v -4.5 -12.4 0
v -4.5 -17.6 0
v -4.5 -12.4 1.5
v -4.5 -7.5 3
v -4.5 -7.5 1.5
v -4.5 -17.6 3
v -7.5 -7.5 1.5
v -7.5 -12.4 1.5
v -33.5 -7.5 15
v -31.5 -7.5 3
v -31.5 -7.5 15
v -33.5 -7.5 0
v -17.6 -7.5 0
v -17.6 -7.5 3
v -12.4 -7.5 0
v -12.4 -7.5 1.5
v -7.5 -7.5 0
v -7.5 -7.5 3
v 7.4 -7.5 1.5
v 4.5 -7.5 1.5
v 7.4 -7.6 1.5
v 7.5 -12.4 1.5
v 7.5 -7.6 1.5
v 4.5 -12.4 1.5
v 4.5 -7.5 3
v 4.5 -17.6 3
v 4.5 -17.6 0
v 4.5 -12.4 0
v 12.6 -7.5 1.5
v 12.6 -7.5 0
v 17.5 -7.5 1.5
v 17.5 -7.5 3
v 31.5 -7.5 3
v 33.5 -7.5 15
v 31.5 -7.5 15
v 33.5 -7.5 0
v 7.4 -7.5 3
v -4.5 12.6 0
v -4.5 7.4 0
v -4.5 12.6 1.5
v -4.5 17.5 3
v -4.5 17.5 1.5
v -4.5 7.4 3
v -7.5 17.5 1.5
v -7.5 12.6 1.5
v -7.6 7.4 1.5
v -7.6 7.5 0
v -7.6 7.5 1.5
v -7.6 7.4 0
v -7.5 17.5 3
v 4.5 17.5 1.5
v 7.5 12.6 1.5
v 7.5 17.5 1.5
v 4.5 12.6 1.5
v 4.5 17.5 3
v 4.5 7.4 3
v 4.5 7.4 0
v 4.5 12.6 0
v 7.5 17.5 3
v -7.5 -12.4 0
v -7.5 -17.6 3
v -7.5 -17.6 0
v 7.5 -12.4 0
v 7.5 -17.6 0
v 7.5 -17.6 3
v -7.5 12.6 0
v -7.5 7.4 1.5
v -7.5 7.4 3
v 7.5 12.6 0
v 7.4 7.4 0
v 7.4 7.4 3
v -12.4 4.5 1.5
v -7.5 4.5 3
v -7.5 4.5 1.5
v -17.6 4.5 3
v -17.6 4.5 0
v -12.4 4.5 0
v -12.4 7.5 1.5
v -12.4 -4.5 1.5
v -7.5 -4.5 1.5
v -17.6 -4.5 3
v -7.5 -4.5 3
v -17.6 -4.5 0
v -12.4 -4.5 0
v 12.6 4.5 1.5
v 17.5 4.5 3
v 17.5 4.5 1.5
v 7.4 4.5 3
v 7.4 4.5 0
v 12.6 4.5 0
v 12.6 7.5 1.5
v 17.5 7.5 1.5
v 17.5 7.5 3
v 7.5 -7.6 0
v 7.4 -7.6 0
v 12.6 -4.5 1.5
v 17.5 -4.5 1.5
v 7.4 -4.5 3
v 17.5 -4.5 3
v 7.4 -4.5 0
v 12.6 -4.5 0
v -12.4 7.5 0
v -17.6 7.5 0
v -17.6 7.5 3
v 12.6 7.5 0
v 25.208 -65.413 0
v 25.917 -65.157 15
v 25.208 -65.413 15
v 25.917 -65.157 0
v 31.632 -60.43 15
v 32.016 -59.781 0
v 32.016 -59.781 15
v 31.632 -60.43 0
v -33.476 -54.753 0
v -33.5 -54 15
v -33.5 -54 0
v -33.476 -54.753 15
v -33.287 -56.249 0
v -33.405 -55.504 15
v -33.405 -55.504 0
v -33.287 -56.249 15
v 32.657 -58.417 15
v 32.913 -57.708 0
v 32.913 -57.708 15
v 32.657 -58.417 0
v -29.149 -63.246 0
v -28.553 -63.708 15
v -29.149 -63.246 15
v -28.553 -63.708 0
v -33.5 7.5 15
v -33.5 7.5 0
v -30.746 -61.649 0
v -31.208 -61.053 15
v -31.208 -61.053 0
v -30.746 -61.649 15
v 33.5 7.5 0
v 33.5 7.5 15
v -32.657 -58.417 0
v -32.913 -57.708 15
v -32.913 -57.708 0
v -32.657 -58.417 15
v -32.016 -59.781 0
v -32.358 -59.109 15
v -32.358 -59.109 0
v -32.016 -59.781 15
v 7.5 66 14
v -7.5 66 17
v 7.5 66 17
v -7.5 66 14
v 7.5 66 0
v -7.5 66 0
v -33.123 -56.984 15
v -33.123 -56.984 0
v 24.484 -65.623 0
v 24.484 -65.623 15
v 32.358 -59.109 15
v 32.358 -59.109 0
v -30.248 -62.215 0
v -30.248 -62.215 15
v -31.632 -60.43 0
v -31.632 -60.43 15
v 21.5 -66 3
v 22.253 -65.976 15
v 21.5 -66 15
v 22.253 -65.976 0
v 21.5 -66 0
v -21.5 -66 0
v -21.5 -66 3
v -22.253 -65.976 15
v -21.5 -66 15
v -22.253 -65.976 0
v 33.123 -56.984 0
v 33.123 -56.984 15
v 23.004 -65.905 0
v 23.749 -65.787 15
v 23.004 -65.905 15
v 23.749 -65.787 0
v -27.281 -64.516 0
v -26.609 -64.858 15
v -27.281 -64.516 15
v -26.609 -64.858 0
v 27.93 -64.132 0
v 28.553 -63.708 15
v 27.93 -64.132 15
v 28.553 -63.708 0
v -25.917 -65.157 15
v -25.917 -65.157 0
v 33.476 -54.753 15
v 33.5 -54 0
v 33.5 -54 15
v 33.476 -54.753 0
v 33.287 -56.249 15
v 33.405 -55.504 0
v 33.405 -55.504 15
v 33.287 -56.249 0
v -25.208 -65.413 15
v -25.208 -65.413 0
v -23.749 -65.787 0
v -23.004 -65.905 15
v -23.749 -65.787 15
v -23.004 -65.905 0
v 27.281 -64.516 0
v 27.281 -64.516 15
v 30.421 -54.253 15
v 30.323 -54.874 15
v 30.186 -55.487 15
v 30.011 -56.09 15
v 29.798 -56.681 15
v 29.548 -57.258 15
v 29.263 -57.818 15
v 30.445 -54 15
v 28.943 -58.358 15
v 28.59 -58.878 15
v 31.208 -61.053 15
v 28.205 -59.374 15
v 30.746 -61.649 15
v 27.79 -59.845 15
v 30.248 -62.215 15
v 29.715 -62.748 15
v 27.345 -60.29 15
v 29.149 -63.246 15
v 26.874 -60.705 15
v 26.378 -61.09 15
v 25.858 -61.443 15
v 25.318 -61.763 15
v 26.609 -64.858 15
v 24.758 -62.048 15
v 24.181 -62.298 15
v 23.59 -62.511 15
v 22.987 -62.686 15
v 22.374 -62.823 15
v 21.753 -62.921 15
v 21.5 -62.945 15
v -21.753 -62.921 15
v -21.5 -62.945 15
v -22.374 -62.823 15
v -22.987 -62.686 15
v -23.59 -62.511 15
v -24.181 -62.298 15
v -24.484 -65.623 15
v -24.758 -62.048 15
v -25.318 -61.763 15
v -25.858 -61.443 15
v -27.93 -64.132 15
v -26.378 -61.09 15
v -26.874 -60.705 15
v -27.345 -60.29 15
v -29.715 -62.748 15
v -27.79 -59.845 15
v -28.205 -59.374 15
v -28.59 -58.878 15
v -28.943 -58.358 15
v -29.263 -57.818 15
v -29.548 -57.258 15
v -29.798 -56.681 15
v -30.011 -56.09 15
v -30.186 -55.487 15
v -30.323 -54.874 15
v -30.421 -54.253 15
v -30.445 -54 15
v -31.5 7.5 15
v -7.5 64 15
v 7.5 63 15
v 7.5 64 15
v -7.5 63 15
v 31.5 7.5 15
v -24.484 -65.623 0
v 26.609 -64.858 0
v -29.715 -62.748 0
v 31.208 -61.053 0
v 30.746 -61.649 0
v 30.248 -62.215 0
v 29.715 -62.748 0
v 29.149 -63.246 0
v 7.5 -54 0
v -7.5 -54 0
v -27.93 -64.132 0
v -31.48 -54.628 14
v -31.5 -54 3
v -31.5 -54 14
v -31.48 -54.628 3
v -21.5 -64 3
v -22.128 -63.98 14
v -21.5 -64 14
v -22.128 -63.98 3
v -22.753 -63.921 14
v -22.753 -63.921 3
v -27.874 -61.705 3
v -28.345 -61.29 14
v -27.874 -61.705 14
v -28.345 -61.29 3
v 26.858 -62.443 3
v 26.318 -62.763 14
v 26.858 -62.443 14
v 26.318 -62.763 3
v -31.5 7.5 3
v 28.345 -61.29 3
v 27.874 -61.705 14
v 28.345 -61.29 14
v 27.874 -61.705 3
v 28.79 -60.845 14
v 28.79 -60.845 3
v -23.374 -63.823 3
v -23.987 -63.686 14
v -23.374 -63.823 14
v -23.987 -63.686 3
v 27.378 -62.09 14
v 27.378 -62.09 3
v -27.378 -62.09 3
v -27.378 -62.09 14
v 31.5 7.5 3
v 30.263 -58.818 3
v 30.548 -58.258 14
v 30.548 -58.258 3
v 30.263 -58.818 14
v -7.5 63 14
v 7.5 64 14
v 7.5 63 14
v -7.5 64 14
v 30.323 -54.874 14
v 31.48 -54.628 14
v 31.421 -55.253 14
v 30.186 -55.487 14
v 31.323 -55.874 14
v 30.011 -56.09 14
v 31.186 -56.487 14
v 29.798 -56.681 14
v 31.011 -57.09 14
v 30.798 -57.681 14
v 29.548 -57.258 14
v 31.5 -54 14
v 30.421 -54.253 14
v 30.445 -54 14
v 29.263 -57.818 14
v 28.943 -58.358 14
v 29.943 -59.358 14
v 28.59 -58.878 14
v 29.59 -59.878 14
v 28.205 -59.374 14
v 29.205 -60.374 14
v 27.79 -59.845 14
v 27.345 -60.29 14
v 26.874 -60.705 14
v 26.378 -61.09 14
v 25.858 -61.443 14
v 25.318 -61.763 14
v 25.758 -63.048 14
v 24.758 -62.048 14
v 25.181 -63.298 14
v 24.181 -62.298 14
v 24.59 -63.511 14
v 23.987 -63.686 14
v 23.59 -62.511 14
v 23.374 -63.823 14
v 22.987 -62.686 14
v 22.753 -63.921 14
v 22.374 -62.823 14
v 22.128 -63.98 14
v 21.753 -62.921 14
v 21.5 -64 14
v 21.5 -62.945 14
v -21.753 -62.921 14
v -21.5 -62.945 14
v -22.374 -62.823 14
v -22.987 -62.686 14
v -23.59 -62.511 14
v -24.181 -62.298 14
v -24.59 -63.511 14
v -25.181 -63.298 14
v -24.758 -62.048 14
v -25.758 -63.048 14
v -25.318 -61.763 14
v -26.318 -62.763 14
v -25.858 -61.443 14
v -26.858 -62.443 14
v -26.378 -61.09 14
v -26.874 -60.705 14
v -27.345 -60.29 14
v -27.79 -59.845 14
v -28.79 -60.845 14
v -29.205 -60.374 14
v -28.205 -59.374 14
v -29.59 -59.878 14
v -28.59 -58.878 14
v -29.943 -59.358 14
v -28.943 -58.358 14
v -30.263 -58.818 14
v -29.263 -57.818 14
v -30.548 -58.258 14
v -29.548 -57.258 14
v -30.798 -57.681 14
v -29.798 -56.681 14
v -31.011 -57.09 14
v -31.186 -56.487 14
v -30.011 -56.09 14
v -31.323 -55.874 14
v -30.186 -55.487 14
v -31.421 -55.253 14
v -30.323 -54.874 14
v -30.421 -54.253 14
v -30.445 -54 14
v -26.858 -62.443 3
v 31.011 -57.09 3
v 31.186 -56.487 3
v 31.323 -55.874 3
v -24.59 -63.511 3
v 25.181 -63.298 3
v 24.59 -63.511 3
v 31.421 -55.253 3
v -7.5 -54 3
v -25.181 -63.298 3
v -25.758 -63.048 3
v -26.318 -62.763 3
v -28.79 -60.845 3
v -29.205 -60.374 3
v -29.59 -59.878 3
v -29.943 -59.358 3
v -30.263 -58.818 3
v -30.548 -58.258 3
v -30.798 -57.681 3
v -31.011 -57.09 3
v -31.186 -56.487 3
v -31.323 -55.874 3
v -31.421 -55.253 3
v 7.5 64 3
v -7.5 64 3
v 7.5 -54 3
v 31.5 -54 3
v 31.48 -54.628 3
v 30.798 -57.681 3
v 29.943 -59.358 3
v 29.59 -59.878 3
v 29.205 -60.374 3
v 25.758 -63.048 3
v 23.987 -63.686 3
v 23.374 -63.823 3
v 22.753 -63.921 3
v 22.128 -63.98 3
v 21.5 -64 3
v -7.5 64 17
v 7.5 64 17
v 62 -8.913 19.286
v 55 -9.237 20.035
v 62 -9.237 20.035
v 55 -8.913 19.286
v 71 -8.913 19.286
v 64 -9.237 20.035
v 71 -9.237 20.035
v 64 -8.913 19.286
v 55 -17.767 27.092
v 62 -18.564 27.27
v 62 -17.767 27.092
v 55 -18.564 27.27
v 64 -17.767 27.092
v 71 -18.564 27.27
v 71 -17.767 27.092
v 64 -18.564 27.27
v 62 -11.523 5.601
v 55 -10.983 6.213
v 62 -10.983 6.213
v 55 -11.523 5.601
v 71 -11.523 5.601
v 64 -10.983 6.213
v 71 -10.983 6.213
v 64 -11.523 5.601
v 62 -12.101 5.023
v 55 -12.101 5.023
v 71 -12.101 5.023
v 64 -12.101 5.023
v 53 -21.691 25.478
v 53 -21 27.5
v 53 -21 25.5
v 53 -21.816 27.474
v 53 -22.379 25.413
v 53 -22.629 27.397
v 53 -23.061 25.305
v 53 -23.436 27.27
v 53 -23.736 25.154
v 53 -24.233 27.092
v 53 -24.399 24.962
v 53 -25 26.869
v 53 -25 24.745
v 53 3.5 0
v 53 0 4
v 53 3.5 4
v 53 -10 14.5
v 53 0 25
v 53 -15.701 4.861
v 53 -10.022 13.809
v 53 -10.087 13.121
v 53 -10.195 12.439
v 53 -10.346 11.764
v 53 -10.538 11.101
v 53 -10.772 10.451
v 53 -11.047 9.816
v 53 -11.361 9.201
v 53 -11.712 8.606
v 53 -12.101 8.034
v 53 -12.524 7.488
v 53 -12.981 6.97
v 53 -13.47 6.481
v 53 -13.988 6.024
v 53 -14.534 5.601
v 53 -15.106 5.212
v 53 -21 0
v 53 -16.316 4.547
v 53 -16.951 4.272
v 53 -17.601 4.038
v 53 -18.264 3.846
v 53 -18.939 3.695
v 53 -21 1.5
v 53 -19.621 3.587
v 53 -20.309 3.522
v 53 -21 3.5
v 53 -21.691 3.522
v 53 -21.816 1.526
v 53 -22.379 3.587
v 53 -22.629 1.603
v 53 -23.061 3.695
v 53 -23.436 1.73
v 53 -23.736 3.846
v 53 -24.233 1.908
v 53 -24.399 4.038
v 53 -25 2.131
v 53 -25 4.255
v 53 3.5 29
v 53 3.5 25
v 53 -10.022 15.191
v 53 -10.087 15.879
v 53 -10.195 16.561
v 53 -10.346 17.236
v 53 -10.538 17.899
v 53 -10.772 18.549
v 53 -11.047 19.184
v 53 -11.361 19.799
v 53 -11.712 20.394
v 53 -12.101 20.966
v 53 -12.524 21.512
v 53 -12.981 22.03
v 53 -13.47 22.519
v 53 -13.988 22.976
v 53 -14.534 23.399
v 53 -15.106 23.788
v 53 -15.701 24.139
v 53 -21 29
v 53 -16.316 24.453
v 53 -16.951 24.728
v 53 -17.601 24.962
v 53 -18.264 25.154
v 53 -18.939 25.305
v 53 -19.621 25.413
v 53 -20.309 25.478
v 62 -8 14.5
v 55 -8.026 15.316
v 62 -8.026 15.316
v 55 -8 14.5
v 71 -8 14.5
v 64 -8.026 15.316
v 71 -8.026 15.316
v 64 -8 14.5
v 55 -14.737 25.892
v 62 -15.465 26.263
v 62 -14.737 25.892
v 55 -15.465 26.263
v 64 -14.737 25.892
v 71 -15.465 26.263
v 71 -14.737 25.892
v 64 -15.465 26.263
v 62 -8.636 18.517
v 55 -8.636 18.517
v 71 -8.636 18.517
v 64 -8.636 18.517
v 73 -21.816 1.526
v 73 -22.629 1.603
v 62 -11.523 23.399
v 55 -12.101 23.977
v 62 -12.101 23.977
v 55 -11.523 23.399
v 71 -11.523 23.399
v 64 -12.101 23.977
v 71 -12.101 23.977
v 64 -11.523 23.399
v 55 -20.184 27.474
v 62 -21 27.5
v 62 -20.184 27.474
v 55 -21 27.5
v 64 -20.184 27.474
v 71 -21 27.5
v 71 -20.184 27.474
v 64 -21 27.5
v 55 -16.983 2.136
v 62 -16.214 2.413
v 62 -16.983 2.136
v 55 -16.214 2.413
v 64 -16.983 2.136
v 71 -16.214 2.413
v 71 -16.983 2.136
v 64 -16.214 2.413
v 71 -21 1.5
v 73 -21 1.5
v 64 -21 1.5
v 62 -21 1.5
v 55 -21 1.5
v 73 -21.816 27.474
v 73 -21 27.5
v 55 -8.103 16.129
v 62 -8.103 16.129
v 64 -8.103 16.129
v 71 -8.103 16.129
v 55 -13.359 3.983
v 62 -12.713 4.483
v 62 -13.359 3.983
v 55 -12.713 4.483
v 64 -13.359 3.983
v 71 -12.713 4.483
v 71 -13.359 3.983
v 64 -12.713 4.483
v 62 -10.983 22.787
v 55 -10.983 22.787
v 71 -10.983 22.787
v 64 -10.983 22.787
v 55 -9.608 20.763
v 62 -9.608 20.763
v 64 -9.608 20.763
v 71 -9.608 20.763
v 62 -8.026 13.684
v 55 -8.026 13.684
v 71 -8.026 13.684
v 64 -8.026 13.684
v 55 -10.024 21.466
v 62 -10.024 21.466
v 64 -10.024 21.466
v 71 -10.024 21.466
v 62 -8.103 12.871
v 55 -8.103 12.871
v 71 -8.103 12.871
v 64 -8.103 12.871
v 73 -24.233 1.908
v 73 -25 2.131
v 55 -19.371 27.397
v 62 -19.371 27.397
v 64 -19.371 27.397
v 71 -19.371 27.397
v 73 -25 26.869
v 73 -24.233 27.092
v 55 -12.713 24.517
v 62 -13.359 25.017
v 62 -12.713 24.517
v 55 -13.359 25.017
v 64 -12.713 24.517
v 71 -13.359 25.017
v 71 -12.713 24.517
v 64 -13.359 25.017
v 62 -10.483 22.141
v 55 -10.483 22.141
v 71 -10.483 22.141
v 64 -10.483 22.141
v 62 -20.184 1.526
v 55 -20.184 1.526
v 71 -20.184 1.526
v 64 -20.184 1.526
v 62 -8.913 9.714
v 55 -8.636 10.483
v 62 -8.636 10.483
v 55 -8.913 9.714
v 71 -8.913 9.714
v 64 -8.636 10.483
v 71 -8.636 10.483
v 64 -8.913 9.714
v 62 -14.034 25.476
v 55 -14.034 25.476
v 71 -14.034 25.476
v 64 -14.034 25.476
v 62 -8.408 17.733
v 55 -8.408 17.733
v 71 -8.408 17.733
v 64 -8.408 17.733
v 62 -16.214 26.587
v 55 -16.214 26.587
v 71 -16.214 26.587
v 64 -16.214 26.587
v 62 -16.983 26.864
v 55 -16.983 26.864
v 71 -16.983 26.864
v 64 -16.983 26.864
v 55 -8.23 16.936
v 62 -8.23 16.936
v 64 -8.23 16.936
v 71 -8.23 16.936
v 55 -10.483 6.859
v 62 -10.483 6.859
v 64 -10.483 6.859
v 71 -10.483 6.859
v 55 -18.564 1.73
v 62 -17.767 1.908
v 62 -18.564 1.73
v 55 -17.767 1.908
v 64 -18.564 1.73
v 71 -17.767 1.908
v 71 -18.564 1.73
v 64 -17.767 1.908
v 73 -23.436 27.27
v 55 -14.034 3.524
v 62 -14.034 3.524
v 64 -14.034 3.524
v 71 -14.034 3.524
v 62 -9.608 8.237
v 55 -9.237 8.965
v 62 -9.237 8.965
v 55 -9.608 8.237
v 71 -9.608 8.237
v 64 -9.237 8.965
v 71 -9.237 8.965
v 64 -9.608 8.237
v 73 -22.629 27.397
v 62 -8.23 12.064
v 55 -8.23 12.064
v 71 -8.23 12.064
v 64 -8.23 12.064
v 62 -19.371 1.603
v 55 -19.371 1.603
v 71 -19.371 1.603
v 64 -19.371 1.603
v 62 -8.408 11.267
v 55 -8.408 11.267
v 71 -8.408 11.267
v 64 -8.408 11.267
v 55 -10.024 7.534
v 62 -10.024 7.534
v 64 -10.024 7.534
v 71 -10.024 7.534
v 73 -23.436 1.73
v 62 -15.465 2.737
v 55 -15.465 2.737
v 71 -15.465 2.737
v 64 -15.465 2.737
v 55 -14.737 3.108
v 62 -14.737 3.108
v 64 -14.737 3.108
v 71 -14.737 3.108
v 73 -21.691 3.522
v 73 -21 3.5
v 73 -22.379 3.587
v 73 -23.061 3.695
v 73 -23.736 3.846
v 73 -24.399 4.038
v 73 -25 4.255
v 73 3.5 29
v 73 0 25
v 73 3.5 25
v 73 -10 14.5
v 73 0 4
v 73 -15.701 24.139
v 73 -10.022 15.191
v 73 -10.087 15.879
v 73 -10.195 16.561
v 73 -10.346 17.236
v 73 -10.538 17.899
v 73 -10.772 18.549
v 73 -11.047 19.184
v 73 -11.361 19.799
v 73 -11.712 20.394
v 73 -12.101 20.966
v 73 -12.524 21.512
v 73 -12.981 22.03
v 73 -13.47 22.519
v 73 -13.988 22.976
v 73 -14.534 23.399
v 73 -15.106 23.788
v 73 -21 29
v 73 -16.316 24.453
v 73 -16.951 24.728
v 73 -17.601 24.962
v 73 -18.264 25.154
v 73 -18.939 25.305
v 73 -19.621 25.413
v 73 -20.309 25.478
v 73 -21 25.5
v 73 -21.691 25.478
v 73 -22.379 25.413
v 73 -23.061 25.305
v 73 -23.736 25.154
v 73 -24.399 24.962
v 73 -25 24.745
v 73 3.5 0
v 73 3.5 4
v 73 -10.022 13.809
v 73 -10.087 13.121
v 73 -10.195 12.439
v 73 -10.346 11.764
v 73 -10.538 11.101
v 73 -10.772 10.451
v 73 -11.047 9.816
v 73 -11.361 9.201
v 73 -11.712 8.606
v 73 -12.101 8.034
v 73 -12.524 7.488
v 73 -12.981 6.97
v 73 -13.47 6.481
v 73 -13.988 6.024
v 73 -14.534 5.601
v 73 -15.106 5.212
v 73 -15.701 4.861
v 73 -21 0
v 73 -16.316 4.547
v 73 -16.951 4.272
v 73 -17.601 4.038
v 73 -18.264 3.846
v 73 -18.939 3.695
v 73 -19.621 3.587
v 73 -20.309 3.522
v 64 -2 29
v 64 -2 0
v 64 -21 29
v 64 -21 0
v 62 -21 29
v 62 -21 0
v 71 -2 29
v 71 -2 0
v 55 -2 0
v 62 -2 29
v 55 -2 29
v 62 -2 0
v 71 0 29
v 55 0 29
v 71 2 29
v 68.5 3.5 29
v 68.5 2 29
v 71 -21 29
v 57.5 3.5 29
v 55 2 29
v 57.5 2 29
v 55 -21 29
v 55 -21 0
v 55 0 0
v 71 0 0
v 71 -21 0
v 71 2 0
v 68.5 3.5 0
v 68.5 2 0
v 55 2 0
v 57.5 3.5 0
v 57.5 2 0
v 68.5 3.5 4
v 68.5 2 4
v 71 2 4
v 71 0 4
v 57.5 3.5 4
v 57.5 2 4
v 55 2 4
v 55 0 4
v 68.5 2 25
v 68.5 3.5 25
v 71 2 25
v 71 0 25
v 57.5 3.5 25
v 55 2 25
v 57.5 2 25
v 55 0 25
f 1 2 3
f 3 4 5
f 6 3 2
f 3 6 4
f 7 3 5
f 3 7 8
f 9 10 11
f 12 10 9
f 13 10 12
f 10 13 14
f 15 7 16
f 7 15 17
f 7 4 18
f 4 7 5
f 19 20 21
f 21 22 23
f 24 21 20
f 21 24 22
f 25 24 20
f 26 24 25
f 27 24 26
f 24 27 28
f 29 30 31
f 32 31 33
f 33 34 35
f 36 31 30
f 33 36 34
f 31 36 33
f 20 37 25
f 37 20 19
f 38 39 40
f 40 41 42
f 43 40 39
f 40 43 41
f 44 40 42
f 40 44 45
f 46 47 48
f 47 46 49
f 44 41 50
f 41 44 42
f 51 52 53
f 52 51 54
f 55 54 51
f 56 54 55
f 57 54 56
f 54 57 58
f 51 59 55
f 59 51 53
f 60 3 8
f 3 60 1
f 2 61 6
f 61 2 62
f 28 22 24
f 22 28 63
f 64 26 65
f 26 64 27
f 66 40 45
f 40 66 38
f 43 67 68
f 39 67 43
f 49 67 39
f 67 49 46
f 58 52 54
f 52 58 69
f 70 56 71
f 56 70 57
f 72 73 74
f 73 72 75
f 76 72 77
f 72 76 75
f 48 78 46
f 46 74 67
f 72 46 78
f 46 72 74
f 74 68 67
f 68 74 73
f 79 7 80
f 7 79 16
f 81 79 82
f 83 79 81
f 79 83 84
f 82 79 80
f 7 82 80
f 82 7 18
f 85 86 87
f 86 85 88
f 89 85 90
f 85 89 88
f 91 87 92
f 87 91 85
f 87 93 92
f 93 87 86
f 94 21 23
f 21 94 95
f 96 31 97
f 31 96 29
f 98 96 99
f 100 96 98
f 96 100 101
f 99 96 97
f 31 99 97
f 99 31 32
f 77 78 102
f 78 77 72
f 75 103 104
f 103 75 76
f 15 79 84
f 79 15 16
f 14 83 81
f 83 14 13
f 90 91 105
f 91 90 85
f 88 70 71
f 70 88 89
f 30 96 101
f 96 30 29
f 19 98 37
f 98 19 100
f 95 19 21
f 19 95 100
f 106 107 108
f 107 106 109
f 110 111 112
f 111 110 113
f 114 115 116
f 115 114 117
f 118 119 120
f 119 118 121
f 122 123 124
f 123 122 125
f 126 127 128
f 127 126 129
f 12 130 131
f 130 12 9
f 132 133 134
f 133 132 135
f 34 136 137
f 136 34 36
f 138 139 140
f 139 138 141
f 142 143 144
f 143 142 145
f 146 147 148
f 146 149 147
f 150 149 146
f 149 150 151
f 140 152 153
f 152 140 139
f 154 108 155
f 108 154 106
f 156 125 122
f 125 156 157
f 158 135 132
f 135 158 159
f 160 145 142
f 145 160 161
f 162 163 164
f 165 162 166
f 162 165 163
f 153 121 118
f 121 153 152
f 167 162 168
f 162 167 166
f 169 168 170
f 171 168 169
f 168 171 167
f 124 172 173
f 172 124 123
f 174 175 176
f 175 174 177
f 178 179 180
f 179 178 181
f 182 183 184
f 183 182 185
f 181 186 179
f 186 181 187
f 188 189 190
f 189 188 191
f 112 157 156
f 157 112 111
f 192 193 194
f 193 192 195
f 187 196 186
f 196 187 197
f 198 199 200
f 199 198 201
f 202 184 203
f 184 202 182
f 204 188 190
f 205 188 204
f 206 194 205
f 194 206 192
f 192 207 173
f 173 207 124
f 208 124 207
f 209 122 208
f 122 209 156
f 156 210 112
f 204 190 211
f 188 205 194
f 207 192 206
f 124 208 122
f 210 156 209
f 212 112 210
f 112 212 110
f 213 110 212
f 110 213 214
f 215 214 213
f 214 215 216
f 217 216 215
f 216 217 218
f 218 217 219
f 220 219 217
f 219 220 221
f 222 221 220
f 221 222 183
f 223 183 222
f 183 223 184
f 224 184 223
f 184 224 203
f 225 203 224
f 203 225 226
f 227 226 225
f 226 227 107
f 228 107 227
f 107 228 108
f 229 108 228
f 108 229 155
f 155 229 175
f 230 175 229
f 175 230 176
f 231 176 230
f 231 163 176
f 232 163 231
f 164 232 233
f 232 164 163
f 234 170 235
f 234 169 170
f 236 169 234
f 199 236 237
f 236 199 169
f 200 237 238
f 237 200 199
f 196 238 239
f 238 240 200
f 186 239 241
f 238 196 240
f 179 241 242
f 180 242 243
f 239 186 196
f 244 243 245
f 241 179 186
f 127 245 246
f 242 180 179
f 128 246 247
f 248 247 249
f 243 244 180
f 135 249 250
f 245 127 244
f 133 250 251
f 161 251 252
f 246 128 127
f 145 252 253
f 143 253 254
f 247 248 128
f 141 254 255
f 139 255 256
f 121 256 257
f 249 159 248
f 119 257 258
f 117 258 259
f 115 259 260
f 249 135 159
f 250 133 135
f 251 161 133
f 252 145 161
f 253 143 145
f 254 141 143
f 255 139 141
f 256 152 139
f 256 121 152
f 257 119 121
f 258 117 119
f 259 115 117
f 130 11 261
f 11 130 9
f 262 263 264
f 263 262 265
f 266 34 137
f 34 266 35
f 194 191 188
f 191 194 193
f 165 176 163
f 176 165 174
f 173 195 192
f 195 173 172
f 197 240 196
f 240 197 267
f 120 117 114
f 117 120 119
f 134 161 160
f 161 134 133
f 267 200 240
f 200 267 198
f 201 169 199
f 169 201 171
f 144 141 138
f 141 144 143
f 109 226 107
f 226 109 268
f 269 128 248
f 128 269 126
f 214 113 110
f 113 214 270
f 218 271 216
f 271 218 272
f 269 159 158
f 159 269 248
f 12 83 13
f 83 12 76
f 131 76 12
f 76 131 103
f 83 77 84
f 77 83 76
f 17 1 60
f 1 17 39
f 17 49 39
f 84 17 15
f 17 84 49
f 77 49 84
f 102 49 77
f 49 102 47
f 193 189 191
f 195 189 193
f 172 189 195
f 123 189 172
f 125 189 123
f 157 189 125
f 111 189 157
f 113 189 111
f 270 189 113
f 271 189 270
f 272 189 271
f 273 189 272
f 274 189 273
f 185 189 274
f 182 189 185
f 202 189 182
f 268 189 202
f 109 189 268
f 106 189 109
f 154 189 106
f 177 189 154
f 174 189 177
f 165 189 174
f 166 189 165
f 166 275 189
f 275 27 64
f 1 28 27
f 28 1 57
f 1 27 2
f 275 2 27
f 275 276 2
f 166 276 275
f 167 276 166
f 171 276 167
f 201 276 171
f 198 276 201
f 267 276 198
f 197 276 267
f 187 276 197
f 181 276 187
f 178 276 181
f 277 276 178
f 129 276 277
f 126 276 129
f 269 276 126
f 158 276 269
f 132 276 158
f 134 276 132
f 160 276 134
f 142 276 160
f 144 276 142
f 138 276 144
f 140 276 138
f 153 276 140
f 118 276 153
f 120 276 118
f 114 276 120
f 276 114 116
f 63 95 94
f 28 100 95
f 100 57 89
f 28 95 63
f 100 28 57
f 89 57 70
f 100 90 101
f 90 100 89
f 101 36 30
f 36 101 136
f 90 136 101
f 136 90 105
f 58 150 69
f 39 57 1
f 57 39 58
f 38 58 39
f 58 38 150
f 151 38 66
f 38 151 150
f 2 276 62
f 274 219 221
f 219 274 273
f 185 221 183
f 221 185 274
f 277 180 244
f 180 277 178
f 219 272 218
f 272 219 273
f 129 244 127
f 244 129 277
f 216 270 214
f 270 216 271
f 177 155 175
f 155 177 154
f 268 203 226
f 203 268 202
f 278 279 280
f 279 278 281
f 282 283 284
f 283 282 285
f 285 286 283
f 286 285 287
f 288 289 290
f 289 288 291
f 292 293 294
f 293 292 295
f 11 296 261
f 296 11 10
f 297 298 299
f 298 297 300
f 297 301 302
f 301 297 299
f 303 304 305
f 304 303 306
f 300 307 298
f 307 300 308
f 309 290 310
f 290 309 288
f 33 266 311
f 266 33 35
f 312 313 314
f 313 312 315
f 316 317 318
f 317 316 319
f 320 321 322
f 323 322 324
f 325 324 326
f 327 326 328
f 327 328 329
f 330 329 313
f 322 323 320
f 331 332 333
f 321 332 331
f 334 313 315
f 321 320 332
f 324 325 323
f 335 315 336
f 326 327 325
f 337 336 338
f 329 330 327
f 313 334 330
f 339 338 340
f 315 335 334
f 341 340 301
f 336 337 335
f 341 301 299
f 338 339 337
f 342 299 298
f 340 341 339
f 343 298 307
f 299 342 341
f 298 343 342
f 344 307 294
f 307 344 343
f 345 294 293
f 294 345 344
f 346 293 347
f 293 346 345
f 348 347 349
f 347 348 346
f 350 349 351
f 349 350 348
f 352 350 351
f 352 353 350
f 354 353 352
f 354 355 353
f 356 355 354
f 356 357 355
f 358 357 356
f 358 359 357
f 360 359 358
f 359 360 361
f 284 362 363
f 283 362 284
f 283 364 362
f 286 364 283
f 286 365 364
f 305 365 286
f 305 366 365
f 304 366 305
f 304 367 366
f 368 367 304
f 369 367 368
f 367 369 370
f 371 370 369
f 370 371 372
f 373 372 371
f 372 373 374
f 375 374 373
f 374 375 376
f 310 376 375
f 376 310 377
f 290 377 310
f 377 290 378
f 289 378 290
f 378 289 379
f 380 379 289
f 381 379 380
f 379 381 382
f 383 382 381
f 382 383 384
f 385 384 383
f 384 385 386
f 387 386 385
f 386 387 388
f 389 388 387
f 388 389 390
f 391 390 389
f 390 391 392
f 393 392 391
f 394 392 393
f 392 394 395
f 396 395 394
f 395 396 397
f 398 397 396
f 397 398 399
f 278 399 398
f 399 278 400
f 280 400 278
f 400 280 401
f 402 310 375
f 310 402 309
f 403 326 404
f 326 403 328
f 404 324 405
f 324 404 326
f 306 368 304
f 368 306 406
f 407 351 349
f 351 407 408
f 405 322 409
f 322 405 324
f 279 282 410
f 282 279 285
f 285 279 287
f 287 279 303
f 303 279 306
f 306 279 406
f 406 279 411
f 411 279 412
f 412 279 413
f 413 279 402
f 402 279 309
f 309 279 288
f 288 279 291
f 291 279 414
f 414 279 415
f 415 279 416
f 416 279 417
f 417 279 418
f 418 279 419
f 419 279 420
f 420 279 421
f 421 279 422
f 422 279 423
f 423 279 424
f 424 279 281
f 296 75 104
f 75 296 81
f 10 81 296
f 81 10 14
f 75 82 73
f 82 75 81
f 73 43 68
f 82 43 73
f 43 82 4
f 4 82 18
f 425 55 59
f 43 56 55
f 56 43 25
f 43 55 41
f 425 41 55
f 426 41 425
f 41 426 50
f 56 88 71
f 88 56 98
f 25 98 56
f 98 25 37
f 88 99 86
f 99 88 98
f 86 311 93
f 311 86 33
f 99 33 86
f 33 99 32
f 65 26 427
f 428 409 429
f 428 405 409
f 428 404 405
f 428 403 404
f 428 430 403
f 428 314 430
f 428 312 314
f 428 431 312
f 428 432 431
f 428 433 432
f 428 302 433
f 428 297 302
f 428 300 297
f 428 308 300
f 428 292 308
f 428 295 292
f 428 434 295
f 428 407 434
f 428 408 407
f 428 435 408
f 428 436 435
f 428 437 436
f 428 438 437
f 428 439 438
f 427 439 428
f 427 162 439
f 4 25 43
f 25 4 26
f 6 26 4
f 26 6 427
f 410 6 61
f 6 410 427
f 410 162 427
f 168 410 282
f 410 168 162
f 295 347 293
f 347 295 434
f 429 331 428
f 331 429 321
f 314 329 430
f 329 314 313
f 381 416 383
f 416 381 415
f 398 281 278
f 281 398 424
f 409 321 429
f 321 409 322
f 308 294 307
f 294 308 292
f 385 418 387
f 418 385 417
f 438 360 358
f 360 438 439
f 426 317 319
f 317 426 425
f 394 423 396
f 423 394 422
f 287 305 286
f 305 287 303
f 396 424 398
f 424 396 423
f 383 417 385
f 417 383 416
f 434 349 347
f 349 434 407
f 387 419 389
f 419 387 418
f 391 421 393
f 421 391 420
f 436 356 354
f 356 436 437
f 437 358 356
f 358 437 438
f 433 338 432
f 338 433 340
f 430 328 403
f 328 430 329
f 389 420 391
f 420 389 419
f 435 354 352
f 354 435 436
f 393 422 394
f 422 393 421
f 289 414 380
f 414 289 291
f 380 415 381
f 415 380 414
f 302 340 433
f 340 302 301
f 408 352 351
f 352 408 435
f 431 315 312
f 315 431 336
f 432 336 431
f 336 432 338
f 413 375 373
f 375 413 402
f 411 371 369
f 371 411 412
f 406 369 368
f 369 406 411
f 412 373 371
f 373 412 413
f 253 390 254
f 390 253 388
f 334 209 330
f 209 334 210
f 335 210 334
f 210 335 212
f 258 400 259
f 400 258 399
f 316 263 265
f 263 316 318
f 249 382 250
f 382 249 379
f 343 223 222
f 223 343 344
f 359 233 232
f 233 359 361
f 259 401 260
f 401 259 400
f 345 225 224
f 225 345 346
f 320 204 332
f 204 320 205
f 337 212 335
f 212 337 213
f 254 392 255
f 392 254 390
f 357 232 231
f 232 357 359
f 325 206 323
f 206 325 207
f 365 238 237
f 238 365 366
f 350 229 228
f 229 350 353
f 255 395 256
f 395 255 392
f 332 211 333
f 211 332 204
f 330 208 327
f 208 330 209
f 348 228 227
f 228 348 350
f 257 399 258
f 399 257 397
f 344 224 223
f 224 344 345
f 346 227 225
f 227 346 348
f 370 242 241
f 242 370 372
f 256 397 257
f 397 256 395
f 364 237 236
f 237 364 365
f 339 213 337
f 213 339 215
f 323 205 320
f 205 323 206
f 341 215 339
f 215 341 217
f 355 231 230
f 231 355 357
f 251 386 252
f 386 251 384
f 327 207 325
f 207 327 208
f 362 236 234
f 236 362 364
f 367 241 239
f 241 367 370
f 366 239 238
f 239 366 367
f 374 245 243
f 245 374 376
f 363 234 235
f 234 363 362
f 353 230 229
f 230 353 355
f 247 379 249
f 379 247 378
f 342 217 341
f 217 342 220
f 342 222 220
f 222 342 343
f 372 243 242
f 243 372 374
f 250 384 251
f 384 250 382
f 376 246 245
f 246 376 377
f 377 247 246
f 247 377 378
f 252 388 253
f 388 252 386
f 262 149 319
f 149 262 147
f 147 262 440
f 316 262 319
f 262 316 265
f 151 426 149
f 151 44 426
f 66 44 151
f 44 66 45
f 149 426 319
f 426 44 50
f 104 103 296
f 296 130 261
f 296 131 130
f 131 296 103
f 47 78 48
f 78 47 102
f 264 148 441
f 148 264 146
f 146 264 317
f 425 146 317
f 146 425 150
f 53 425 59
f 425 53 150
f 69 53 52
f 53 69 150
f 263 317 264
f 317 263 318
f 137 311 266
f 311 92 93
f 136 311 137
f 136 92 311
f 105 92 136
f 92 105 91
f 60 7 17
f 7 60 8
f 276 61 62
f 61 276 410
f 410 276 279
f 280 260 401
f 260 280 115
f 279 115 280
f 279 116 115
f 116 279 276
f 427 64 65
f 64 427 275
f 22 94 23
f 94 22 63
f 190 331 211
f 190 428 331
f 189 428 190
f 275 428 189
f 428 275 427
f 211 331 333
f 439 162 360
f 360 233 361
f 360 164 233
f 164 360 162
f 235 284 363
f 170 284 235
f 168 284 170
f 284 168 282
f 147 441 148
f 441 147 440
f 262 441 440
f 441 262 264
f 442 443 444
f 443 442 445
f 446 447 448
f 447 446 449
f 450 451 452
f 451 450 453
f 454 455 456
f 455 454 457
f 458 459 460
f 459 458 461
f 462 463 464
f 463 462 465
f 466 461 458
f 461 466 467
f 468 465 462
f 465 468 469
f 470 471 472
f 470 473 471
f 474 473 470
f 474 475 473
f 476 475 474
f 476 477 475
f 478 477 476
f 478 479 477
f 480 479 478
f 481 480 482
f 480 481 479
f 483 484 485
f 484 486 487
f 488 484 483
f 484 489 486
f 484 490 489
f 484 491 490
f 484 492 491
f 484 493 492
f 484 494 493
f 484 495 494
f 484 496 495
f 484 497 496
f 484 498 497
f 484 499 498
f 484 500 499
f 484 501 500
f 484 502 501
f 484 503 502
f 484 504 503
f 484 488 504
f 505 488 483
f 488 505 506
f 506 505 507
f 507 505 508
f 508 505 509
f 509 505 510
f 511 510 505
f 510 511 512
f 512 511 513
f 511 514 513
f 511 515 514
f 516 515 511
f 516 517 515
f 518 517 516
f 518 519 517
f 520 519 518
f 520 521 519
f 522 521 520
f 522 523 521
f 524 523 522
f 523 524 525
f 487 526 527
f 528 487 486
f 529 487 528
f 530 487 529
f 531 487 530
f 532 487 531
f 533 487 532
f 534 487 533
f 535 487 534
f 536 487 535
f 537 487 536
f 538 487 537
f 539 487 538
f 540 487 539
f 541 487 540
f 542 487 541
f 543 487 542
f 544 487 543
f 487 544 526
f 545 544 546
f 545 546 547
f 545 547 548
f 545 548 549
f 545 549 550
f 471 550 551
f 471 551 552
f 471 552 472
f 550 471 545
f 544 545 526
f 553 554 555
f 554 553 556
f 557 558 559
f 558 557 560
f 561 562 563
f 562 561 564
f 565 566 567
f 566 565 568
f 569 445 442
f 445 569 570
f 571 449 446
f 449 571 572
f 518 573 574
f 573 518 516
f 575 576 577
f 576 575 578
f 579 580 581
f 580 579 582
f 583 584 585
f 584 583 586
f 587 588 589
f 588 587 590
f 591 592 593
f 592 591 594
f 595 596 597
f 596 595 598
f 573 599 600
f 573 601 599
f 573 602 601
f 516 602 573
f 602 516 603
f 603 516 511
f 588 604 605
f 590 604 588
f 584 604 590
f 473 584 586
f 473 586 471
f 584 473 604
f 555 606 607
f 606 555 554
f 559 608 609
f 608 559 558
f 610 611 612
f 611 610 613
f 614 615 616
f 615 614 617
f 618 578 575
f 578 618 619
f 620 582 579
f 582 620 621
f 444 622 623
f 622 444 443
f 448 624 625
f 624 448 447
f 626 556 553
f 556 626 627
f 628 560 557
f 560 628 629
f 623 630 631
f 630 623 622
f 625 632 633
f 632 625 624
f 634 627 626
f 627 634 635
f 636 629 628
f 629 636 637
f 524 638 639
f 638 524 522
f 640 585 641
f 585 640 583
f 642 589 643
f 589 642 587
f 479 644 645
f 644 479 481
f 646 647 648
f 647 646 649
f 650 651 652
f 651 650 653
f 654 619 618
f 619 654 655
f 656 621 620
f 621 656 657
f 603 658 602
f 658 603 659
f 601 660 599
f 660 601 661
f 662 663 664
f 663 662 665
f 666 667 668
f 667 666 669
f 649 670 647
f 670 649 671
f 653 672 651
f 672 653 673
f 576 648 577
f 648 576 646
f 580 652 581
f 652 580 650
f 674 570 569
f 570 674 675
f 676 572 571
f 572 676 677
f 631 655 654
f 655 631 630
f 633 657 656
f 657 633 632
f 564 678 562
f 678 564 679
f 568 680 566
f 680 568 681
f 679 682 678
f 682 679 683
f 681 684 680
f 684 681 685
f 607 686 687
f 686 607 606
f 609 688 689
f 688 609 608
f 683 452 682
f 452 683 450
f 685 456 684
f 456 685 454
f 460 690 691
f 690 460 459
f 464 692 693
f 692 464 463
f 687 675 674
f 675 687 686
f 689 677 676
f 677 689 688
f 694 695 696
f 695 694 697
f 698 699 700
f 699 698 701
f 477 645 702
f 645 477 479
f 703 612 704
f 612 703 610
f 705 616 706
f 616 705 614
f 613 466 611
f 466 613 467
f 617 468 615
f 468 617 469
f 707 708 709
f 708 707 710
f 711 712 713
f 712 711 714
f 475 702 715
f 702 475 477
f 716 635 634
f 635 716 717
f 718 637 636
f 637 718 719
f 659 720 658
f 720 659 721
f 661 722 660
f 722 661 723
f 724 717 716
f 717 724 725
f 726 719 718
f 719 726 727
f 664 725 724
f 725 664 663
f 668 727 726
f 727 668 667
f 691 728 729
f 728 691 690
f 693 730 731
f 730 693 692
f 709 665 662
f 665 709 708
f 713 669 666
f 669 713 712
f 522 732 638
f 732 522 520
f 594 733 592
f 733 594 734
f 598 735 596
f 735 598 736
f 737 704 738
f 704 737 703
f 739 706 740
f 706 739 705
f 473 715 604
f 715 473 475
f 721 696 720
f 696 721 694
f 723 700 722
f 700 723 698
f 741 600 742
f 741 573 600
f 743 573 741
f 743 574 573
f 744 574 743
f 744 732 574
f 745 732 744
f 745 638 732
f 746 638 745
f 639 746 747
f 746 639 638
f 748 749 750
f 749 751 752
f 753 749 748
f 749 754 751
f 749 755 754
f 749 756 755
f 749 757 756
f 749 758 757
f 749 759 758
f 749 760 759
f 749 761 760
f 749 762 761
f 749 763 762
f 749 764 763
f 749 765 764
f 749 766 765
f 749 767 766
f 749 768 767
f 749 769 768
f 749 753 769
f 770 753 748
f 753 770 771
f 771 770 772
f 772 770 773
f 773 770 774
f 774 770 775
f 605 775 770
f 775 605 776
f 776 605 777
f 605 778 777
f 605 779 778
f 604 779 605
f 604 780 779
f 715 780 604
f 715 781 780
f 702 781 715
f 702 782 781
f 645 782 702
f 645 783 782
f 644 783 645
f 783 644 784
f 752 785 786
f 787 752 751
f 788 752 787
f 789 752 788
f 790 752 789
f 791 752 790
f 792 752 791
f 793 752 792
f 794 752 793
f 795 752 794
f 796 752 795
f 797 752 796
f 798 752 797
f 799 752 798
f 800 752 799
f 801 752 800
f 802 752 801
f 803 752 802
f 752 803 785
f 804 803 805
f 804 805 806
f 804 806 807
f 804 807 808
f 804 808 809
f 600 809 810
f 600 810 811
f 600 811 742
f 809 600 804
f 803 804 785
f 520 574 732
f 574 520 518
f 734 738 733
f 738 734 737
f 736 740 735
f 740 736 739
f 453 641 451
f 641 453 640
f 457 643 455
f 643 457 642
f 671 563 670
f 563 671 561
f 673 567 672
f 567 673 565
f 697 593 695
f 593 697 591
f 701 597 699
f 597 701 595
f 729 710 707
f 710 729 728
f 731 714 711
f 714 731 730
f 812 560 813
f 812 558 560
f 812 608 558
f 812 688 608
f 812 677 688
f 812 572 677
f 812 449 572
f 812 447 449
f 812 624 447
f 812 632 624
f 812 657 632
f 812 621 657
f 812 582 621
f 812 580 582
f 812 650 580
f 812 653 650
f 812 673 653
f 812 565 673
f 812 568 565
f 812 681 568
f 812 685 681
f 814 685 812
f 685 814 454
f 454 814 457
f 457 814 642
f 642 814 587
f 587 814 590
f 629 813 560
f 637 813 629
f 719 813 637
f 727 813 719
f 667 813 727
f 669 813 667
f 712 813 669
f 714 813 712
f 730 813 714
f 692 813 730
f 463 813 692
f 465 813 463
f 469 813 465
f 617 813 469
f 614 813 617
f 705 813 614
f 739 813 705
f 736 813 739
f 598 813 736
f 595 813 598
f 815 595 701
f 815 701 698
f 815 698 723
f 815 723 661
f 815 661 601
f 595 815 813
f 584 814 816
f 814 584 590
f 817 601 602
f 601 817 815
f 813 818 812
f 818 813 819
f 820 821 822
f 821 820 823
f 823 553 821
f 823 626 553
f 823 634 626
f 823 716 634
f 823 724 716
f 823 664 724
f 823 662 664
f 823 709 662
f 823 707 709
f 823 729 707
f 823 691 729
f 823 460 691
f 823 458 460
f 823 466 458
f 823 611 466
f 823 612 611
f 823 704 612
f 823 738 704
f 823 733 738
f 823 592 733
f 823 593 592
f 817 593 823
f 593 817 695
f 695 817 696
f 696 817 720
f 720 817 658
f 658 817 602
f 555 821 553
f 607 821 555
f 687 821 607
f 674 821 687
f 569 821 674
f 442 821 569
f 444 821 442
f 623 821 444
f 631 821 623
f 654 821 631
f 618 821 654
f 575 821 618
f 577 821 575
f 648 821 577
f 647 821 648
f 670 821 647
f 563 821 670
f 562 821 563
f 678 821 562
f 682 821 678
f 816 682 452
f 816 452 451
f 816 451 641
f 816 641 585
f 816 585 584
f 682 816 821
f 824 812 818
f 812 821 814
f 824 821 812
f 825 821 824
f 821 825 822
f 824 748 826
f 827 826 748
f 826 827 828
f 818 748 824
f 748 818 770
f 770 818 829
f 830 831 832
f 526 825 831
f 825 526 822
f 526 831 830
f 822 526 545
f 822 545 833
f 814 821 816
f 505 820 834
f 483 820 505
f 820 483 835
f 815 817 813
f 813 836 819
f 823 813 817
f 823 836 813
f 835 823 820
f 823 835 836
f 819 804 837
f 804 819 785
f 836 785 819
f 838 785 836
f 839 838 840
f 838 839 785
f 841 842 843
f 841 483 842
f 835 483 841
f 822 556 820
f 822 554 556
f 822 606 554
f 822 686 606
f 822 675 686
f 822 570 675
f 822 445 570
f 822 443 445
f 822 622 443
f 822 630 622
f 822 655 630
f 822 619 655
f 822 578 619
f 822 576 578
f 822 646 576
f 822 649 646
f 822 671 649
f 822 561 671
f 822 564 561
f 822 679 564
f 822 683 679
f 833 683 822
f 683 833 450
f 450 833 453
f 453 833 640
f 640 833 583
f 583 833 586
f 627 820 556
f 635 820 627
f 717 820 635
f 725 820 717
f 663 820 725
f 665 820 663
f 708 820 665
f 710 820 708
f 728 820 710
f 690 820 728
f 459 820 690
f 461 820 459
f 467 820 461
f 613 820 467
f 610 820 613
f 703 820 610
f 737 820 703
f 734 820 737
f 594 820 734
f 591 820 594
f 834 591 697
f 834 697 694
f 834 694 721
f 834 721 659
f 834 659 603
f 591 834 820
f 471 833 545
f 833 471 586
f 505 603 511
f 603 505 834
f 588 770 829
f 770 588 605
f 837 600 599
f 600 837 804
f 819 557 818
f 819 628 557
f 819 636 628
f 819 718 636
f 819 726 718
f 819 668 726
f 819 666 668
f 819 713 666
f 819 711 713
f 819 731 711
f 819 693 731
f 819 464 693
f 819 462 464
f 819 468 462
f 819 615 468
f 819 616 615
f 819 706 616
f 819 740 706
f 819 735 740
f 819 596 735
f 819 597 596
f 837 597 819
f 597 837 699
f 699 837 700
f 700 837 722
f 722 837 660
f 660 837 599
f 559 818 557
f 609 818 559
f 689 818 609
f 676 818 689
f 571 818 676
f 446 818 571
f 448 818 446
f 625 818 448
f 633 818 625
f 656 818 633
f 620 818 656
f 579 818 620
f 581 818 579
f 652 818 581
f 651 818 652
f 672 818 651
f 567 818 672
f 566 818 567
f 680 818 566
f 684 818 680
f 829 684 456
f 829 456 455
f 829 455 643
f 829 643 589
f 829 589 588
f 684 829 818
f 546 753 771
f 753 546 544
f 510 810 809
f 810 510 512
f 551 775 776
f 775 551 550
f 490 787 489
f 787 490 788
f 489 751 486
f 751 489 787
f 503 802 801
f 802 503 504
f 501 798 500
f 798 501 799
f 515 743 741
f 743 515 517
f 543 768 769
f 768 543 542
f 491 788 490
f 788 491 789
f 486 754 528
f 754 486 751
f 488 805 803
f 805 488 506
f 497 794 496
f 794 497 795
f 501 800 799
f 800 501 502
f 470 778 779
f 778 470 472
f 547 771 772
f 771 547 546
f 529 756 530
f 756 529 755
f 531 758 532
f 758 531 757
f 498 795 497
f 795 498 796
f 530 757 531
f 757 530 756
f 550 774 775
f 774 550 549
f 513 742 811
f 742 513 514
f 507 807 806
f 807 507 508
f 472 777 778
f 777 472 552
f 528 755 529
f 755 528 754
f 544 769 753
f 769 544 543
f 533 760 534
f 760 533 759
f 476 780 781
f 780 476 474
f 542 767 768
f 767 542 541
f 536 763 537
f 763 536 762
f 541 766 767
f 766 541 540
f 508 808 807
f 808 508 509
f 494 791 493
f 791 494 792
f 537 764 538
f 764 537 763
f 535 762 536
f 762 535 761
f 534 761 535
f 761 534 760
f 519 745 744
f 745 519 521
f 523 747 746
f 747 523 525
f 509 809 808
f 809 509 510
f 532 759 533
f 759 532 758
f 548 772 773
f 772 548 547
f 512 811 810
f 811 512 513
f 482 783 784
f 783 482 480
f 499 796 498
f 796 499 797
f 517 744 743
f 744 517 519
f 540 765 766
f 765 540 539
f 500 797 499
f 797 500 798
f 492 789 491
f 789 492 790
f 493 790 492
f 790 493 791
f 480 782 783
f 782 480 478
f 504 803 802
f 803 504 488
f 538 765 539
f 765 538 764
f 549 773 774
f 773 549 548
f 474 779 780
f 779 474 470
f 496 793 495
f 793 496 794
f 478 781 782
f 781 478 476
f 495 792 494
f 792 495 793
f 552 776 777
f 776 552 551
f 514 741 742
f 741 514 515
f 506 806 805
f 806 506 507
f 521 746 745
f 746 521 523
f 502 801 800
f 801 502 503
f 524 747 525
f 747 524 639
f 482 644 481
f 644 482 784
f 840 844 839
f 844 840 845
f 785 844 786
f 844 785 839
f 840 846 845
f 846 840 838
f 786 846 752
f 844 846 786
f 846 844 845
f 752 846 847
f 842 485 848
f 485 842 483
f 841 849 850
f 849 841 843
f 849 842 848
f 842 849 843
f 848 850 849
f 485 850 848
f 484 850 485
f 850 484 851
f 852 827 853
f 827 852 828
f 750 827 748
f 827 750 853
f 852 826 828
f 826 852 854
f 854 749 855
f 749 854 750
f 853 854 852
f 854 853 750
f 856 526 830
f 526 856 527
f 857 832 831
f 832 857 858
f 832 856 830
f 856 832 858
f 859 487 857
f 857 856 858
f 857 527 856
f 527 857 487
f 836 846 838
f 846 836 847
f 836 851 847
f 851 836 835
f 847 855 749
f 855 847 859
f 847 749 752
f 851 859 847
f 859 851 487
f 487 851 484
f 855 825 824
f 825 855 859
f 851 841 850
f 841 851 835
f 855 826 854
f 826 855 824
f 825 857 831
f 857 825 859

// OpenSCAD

// The outer width (from left to right without buttons) of the phone or bumper in millimeters
width = 63;
// The outer length (from top to bottom without buttons) of the phone or bumper in millimeters
length = 128;
// The outer height (from backside to front side) of the phone or bumper in millimeters
height = 11;
// The width of the bridges from top to bottom and from left to right in millimeters. Lower values save material, higher values make the mount more stable. 15 millimeter is a good choice.
bridgewidth = 15;
// The radius of the corners of the phone or bumper. The standard Apple bumper for iPhone 5 has a corner radius of 10 millimeter.
cornerradius = 10;
// The distance bwtween the iPhone holder and the bike's tube in millimeter. Make it larger when you have other obstacles mounted on the bike.
mountheight = 10;
// The diameter of the tube where to mount the holder in millimeters.
tubediameter = 22;
// The fininess of the cylinders. 100 is a good start.
$fn = 100;

module connector(stegwidth) {
	// plates
	translate([-stegwidth/2-2.5,-stegwidth/2-4.5,2]) cube([4.5,4,1.5]);
	translate([stegwidth/2-2,-stegwidth/2-4.5,2]) cube([4.5,4,1.5]);
	translate([-stegwidth/2-2.5,stegwidth/2+5.5,2]) cube([4.5,4,1.5]);
	translate([stegwidth/2-2,stegwidth/2+5.5,2]) cube([4.5,4,1.5]);
	// pins
	translate([-stegwidth/2-2.5,-stegwidth/2-4.5,0]) cube([2,4,2]);
	translate([stegwidth/2+0.5,-stegwidth/2-4.5,0]) cube([2,4,2]);
	translate([-stegwidth/2-2.5,stegwidth/2+5.5,0]) cube([2,4,2]);
	translate([stegwidth/2+0.5,stegwidth/2+5.5,0]) cube([2,4,2]);
}

module connectorcutout(stegwidth) {
		translate([-stegwidth/2-0.1,-stegwidth/2-5,1.5]) cube([3.1,5,1.6]);
		translate([stegwidth/2-3,-stegwidth/2-5,1.5]) cube([3.1,5,1.6]);
		translate([-stegwidth/2-0.1,stegwidth/2+5,1.5]) cube([3.1,5,1.6]);
		translate([stegwidth/2-3,stegwidth/2+5,1.5]) cube([3.1,5,1.6]);
		translate([-stegwidth/2-0.1,-stegwidth/2-10.1,-0.1]) cube([3.1,5.2,3.2]);
		translate([stegwidth/2-3,-stegwidth/2-10.1,-0.1]) cube([3.1,5.2,3.2]);
		translate([-stegwidth/2-0.1,stegwidth/2-0.1,-0.1]) cube([3.1,5.2,3.2]);
		translate([stegwidth/2-3,stegwidth/2-0.1,-0.1]) cube([3.1,5.2,3.2]);
}

module case(width, height, depth, radius, stegwidth) {
	difference() {
		// Outer hull
		hull() {
			translate([-width/2+radius, -height/2+radius, 0]) cylinder(r=radius+2, h=depth+4);
			translate([-width/2+radius, +height/2-radius, 0]) cylinder(r=radius+2, h=depth+4);
			translate([+width/2-radius, -height/2+radius, 0]) cylinder(r=radius+2, h=depth+4);
			translate([+width/2-radius, +height/2-radius, 0]) cylinder(r=radius+2, h=depth+4);
		}
		// substract iPhone itself
		hull() {
			translate([-width/2+radius, -height/2+radius, 3]) cylinder(r=radius, h=depth);
			translate([-width/2+radius, +height/2-radius, 3]) cylinder(r=radius, h=depth);
			translate([+width/2-radius, -height/2+radius, 3]) cylinder(r=radius, h=depth);
			translate([+width/2-radius, +height/2-radius, 3]) cylinder(r=radius, h=depth);
		}
		// display
		hull() {
			translate([-width/2+radius+1, -height/2+radius+1, depth+2.9]) cylinder(r=radius, h=1.2);
			translate([-width/2+radius+1, +height/2-radius-1, depth+2.9]) cylinder(r=radius, h=1.2);
			translate([+width/2-radius-1, -height/2+radius+1, depth+2.9]) cylinder(r=radius, h=1.2);
			translate([+width/2-radius-1, +height/2-radius-1, depth+2.9]) cylinder(r=radius, h=1.2);
		}
		// left and right pins
		translate([-width/2,-stegwidth/2-0.1,depth+2.9]) cube([width,stegwidth+0.2,1.2]);
		// upper left corner
		translate([-width/2-2.1, +stegwidth/2, -0.1]) cube([width/2-stegwidth/2+2.1,height/2-2.9,depth+4.2]);
		// upper right corner
		translate([+stegwidth/2, +stegwidth/2, -0.1]) cube([width/2-stegwidth/2+2.1,height/2-2.9,depth+4.2]);
		// lower left cut
		translate([-width/2-2.1, -height/2+radius, -0.1]) cube([width/2-stegwidth/2+2.1,height/2-stegwidth/2-radius,depth+4.2]);
		// lower right cut
		translate([+stegwidth/2, -height/2+radius, -0.1]) cube([width/2-stegwidth/2+2.1,height/2-stegwidth/2-radius,depth+4.2]);
		// lower connectors cut
		translate([-width/2+radius, -height/2-2.1, 3]) cube([width-radius-radius,3.2,depth+4.2]);
		// vertical connector cutouts
		connectorcutout(stegwidth);
		// horizontal connector cutouts
		rotate([0, 0, -90]) connectorcutout(stegwidth);
	}
	// Schnippel zum losmachen
	translate([-stegwidth/2,height/2,depth+3]) cube([stegwidth,2,3]);
}

module holder(height, radius, stegwidth) {
	// upper plate
	translate([-stegwidth/2-2.5,-stegwidth/2-7,0]) cube([stegwidth+5,stegwidth+14,2]);
	// ring
	difference() {
		union() {
			translate([-stegwidth/2-2.5,0,radius+height]) rotate([0,90,0]) cylinder(r=radius+2,h=stegwidth+5);
			// vertikale Stege
			translate([-1, -stegwidth/2-7, 2]) cube([2,stegwidth+14,radius+height-2]);
			translate([-stegwidth/2-2.5, -stegwidth/2-7, 2]) cube([2,stegwidth+14,radius+height-2]);
			translate([stegwidth/2+0.5, -stegwidth/2-7, 2]) cube([2,stegwidth+14,radius+height-2]);
		}
		translate([-stegwidth/2-2.6,0,radius+height]) rotate([0,90,0]) cylinder(r=radius,h=stegwidth+5.2);
		// lower ring cut
		translate([-stegwidth/2-2.6, -radius-2.1, radius+height+4]) cube([stegwidth+5.2,radius*2+4.2,radius+4]);
	}
	// connector
	translate([0,-2.5,0]) rotate([0, 180, 0]) connector(stegwidth);
}

case(width, length, height, cornerradius, bridgewidth);
rotate([90,0,0]) translate([width, tubediameter/2+2 > 14.5 ? tubediameter/2+2 : 14.5, 0]) holder(mountheight, tubediameter/2, bridgewidth);
//rotate([180,0,90]) translate([0, 2, 0]) holder(mountheight, tubediameter/2, bridgewidth);
//rotate([90,0,0]) translate([width, 14.5, 0]) holder(mountheight, tubediameter/2, bridgewidth);
